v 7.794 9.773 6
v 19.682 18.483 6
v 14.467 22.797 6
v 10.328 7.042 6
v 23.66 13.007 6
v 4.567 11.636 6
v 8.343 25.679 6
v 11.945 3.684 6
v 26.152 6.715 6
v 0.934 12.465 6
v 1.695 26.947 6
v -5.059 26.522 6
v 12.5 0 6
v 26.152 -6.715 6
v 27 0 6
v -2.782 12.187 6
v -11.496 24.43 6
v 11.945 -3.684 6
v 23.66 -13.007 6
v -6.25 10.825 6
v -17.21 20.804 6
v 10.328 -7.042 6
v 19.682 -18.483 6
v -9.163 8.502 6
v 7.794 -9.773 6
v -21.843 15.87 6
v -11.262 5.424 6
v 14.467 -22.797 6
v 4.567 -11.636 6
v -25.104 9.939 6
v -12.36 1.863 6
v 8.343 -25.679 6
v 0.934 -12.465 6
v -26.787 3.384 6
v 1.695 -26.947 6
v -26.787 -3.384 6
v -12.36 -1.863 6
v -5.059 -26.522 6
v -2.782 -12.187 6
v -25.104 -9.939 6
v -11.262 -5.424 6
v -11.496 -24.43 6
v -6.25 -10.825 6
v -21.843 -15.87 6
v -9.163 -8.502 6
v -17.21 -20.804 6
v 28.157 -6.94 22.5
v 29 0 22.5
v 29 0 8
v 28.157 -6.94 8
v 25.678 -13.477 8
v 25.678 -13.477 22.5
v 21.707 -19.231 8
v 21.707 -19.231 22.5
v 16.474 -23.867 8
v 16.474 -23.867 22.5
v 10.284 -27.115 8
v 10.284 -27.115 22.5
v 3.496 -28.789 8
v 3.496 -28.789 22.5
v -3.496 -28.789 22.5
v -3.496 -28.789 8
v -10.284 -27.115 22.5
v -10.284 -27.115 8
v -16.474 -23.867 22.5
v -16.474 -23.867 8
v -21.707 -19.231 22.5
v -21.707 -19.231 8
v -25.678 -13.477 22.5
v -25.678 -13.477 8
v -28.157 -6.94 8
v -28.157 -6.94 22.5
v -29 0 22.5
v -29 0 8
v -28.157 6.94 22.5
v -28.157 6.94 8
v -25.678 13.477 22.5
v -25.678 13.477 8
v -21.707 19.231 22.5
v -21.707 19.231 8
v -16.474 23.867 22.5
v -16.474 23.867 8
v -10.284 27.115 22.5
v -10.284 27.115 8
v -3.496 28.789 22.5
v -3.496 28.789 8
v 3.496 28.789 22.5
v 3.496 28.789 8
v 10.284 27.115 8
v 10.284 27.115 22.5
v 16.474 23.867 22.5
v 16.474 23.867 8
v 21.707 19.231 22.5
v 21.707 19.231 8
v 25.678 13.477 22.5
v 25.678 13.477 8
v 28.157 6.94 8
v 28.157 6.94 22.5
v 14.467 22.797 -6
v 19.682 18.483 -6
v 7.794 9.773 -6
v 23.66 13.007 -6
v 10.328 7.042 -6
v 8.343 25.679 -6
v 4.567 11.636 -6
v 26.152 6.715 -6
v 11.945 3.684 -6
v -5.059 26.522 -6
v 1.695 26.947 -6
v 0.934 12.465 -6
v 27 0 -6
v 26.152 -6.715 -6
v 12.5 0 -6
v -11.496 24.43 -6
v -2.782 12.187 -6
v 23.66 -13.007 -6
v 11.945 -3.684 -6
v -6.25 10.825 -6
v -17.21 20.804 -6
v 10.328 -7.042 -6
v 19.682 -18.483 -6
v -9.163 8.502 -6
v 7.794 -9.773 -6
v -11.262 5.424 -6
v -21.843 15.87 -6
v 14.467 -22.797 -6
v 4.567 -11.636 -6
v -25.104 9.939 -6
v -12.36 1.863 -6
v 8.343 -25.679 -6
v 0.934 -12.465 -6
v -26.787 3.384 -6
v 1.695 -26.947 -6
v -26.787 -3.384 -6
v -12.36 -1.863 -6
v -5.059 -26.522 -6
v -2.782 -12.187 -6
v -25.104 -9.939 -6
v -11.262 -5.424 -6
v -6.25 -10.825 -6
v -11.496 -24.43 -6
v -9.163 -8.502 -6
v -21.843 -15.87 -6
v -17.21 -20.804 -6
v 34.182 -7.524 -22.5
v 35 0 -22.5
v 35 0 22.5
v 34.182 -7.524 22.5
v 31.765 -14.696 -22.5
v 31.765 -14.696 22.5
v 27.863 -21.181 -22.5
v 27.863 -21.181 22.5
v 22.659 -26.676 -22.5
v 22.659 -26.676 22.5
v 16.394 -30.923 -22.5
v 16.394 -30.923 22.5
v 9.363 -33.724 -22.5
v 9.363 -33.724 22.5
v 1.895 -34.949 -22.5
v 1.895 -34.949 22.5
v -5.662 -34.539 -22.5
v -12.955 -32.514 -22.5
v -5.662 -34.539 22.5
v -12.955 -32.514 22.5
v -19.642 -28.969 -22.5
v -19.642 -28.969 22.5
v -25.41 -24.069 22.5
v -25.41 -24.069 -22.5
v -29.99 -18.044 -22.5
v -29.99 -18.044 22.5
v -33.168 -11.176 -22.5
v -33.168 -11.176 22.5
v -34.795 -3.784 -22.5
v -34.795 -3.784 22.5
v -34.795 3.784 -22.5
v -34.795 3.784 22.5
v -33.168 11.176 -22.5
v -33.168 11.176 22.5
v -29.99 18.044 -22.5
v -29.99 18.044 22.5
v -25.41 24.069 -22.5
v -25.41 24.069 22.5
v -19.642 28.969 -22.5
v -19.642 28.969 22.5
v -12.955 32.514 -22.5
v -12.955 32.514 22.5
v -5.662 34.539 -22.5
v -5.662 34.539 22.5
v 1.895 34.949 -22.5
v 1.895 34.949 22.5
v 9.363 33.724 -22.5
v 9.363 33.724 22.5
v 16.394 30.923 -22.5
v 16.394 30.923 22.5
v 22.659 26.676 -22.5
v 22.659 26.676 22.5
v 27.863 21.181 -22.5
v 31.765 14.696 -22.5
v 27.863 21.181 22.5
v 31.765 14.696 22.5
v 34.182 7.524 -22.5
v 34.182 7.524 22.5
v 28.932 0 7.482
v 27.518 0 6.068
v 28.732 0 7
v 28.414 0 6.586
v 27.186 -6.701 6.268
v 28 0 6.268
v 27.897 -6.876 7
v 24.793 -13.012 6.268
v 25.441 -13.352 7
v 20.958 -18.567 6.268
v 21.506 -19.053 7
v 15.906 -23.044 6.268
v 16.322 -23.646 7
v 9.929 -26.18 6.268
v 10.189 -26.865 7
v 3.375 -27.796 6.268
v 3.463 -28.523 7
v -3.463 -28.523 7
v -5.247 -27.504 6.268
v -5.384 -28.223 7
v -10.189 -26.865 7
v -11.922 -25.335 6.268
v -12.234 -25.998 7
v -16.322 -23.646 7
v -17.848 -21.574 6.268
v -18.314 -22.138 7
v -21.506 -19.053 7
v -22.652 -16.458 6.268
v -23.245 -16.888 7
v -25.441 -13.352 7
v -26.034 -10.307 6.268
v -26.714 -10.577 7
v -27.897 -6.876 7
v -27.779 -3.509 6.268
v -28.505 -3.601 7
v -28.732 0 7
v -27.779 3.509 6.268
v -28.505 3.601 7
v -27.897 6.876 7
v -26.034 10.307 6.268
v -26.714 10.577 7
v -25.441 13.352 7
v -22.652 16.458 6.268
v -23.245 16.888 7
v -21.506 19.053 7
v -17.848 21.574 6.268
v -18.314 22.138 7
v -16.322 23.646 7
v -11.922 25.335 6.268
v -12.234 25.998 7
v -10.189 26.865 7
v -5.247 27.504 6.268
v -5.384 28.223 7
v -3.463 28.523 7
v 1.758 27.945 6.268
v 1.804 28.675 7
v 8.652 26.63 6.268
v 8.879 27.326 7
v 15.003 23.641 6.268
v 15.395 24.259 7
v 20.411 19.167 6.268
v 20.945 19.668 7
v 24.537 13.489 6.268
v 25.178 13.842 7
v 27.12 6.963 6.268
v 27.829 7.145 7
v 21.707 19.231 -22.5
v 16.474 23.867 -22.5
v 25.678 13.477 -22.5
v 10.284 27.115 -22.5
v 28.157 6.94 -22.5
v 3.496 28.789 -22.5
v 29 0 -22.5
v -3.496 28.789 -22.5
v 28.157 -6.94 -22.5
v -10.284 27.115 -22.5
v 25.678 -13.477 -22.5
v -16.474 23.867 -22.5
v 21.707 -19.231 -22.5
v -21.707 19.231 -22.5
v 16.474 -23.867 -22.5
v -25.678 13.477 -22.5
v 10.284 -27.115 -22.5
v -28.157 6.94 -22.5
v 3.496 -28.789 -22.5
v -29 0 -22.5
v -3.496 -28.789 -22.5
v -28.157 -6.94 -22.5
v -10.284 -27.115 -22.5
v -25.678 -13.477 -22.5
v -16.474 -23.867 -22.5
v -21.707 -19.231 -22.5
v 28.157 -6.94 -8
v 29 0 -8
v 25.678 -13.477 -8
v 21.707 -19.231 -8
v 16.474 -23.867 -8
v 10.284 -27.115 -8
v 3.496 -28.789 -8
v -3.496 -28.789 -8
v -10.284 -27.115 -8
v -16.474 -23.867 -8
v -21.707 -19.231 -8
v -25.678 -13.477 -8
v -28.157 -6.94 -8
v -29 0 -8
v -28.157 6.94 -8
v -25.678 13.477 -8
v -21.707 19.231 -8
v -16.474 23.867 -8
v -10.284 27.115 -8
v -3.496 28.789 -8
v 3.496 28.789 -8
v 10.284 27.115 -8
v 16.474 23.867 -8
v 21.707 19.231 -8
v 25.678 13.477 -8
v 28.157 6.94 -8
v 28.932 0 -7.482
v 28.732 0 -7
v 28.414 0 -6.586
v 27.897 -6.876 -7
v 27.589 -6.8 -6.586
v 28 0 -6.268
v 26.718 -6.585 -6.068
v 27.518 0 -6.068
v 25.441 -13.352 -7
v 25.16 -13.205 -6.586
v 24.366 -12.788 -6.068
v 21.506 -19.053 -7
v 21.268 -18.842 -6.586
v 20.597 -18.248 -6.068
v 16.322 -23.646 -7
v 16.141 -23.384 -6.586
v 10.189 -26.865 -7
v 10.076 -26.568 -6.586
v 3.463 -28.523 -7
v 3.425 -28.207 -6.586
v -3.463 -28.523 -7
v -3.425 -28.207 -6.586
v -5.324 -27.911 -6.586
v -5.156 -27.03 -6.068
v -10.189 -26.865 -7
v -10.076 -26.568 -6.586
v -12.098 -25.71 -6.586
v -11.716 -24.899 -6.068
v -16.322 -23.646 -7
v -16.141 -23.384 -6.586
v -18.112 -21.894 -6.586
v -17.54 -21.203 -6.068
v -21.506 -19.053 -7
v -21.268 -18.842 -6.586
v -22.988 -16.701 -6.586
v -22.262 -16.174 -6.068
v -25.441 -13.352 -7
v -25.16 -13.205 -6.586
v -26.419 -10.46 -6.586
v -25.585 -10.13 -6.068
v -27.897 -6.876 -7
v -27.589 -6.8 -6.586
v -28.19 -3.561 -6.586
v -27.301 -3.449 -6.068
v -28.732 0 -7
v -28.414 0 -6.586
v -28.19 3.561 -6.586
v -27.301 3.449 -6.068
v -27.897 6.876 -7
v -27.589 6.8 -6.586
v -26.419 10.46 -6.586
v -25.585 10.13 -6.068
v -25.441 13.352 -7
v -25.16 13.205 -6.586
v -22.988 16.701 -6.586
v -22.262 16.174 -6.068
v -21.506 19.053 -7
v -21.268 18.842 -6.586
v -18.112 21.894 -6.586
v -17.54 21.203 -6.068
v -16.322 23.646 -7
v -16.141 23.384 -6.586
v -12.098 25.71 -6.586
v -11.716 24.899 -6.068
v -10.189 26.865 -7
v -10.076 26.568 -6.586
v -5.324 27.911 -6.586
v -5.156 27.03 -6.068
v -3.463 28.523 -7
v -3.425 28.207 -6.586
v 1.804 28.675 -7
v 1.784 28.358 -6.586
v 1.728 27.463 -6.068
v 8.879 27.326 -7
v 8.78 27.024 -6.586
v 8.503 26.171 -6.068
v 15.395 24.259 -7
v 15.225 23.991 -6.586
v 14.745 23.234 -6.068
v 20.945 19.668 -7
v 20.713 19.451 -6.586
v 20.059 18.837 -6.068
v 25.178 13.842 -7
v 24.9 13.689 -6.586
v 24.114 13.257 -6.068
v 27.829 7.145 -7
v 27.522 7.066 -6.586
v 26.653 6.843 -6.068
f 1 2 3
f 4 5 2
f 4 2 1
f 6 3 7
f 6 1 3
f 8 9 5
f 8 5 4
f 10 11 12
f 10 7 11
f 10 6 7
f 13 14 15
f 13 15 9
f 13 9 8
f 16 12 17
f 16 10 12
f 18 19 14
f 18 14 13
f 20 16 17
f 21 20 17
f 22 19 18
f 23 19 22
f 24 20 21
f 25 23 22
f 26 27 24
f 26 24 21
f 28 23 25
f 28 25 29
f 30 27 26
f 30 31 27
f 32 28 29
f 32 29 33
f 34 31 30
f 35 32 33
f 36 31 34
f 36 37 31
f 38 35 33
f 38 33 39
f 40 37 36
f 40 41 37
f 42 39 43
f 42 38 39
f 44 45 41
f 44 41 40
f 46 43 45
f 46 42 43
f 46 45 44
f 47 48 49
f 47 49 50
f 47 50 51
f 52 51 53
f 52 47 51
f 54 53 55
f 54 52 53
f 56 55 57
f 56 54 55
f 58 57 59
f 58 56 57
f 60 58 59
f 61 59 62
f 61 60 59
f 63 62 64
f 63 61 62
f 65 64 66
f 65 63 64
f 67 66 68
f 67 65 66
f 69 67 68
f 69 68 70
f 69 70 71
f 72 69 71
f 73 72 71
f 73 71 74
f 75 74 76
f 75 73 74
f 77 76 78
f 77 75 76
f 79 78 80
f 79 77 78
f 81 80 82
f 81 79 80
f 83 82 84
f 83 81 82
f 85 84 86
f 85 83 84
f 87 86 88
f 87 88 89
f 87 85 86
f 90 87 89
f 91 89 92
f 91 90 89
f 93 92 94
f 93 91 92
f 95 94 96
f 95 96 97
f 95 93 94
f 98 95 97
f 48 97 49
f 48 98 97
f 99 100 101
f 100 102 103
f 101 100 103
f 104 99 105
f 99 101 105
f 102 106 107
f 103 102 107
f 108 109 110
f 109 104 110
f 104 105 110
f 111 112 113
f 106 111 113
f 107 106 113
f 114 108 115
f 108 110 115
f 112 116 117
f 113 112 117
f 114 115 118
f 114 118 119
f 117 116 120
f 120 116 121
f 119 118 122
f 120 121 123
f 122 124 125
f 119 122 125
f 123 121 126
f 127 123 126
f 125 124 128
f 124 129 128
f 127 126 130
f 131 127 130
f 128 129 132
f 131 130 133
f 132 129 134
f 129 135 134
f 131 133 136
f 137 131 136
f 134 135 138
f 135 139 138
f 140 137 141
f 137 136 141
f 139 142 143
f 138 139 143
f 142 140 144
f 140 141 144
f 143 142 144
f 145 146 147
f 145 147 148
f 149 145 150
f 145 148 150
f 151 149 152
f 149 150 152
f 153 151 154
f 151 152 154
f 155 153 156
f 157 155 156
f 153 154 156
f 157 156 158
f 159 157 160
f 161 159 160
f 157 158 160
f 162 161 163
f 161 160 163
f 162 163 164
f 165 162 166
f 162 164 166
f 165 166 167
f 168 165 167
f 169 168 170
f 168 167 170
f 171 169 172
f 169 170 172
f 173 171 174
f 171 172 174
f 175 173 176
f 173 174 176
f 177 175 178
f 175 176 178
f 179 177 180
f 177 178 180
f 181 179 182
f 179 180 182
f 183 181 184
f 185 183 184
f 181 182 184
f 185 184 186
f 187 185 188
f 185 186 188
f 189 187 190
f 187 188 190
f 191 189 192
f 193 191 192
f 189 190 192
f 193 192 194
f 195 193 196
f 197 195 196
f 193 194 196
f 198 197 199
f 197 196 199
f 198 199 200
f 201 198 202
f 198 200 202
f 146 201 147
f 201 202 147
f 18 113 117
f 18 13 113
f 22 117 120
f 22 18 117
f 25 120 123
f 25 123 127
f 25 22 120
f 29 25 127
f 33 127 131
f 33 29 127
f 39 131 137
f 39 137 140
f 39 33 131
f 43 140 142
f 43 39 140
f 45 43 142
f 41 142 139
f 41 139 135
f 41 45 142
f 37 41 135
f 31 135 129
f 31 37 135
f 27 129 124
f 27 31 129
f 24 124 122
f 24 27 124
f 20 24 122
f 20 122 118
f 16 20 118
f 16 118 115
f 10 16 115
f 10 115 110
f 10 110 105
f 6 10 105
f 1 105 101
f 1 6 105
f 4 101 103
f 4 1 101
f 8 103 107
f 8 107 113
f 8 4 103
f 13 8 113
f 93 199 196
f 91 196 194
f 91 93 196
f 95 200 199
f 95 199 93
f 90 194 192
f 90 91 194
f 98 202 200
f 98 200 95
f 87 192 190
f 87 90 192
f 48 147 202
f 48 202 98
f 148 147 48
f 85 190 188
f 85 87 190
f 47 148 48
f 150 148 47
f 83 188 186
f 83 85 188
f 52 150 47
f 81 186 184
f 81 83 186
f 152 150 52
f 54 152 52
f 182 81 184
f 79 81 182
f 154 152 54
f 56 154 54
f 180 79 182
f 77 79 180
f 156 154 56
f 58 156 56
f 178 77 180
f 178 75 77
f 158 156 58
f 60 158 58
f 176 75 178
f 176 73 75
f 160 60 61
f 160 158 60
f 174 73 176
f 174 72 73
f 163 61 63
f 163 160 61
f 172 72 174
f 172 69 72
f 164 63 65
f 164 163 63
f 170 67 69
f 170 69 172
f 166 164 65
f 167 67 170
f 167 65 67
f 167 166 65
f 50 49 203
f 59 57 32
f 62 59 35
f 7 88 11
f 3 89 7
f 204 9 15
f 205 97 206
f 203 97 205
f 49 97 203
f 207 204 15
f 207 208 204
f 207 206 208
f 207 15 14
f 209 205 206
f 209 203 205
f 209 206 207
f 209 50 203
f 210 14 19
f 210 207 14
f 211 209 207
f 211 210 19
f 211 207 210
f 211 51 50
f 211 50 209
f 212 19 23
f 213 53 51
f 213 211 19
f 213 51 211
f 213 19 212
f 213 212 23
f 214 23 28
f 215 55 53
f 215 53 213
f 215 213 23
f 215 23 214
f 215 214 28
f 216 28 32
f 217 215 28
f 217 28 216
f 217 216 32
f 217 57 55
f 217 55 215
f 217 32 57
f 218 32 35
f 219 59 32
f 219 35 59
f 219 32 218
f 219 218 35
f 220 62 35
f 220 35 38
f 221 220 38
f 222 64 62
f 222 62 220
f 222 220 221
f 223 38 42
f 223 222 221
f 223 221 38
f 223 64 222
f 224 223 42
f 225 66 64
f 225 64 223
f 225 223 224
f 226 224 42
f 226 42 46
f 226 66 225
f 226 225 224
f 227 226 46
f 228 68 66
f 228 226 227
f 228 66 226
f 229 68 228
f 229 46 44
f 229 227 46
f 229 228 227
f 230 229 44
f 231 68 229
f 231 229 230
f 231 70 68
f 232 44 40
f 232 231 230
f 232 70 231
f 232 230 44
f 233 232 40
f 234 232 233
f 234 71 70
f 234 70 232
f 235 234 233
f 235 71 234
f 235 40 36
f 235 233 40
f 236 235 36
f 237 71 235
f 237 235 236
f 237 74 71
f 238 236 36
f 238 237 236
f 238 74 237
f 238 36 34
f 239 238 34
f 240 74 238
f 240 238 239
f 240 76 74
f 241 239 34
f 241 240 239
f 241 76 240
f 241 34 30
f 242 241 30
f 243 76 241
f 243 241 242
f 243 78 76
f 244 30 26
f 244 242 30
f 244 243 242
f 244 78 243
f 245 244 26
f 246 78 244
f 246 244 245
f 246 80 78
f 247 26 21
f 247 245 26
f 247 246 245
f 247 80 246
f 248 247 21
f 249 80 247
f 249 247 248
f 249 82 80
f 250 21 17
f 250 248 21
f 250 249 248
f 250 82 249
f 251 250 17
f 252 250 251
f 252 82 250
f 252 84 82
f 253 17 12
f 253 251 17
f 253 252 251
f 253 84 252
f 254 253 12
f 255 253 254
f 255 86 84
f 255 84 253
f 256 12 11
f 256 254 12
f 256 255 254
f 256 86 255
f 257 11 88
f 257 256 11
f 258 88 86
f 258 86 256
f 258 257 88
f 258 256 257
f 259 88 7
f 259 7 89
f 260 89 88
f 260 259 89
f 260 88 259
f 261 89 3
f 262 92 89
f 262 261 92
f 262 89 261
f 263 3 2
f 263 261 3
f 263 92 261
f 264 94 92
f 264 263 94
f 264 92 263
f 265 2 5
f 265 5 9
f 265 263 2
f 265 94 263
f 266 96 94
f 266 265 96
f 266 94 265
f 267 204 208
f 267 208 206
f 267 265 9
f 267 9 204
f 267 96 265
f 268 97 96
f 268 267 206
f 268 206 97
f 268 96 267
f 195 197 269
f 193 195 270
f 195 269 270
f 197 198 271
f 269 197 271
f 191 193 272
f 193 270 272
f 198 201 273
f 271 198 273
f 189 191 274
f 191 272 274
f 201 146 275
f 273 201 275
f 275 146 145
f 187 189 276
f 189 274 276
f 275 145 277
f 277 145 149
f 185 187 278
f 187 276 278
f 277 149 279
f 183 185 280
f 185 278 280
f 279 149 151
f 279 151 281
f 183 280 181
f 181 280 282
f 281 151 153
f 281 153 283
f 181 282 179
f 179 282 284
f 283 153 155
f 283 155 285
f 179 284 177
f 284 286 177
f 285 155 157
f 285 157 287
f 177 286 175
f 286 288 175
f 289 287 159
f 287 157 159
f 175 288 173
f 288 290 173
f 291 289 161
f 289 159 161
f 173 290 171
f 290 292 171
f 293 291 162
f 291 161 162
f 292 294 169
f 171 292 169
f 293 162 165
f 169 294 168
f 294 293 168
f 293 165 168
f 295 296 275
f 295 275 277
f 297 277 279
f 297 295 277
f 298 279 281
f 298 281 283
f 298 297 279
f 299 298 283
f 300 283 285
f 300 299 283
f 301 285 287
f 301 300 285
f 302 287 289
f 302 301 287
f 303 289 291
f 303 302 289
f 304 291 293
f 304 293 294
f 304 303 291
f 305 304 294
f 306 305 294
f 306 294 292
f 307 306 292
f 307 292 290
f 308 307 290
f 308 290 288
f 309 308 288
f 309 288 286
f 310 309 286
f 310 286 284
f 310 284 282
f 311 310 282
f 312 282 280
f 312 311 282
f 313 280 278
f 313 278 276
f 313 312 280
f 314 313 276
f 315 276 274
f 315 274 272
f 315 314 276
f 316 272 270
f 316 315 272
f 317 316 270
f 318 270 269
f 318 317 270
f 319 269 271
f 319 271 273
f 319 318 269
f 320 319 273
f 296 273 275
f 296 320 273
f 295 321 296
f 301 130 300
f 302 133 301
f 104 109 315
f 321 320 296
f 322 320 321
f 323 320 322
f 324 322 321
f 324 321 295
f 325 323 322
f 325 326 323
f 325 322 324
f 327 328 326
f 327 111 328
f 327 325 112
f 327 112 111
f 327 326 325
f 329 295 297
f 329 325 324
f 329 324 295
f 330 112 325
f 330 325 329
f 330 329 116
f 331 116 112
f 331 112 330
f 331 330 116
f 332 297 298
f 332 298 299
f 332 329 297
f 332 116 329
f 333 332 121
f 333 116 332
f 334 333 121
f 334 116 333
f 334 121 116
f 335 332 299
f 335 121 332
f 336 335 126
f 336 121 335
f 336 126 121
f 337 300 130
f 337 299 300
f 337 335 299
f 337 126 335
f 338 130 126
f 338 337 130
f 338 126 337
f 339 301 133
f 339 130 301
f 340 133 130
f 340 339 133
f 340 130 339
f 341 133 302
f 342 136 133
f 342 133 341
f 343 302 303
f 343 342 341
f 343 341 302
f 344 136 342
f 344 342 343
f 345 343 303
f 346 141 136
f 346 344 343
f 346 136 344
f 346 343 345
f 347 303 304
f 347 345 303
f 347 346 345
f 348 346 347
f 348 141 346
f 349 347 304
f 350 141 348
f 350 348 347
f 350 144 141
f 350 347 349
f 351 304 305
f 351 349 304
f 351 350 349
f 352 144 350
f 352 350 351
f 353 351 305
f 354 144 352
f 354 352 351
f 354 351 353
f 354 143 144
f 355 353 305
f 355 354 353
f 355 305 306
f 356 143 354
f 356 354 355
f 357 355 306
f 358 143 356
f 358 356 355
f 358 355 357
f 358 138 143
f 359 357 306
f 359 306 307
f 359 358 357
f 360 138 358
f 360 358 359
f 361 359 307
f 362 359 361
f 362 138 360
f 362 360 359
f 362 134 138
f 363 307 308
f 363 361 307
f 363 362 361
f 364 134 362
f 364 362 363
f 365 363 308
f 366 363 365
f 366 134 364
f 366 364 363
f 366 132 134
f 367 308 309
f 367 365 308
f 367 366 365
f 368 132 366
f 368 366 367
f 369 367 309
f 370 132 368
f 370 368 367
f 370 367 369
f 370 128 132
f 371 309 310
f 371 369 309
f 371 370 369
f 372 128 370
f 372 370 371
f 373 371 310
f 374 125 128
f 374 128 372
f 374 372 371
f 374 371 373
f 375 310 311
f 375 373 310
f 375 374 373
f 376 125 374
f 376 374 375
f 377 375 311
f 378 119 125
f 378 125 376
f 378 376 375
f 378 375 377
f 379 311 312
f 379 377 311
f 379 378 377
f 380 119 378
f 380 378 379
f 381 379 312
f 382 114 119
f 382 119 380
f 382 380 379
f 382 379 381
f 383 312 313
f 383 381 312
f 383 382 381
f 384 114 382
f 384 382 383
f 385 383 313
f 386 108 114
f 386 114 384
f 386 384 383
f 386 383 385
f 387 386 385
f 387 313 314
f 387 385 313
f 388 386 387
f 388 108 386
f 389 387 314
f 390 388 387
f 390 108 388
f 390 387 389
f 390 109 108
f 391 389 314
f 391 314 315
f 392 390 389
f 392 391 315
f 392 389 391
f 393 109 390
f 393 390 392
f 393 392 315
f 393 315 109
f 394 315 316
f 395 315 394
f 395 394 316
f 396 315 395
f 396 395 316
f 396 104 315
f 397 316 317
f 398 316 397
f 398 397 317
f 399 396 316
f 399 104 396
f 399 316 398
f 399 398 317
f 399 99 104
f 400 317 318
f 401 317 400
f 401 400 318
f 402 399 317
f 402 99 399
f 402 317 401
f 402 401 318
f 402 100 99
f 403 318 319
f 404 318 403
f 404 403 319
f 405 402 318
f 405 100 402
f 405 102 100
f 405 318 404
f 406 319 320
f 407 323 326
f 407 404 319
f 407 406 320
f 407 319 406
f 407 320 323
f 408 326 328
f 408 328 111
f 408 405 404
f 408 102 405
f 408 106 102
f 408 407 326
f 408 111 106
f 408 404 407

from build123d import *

# Parameters (mm, degrees)
F0_W = 6
F0_H = 45
F2_W = 16.5
F2_H = 12
F4_R = 2


with BuildPart() as f1:
    # F0 (on Front) → F1 (revolve)
    with BuildSketch(Plane.XZ):
        with Locations((32, 0)):
            Rectangle(F0_W, F0_H)
    revolve(axis=Axis((0, 0, 12.074299), (0, 0, -1)))

    # F2 (on Front) → F3 (revolve)
    with BuildSketch(Plane.XZ):
        with Locations((20.75, 0)):
            Rectangle(F2_W, F2_H)
    revolve(axis=Axis((0, 0, 3.15167), (0, 0, -1)))

    # F4
    f4_edges = [f1.edges().sort_by_distance(p)[0] for p in [
        (-29, 0, 6),
        (-29, 0, -6),
    ]]
    fillet(f4_edges, radius=F4_R)


solid = f1.part
